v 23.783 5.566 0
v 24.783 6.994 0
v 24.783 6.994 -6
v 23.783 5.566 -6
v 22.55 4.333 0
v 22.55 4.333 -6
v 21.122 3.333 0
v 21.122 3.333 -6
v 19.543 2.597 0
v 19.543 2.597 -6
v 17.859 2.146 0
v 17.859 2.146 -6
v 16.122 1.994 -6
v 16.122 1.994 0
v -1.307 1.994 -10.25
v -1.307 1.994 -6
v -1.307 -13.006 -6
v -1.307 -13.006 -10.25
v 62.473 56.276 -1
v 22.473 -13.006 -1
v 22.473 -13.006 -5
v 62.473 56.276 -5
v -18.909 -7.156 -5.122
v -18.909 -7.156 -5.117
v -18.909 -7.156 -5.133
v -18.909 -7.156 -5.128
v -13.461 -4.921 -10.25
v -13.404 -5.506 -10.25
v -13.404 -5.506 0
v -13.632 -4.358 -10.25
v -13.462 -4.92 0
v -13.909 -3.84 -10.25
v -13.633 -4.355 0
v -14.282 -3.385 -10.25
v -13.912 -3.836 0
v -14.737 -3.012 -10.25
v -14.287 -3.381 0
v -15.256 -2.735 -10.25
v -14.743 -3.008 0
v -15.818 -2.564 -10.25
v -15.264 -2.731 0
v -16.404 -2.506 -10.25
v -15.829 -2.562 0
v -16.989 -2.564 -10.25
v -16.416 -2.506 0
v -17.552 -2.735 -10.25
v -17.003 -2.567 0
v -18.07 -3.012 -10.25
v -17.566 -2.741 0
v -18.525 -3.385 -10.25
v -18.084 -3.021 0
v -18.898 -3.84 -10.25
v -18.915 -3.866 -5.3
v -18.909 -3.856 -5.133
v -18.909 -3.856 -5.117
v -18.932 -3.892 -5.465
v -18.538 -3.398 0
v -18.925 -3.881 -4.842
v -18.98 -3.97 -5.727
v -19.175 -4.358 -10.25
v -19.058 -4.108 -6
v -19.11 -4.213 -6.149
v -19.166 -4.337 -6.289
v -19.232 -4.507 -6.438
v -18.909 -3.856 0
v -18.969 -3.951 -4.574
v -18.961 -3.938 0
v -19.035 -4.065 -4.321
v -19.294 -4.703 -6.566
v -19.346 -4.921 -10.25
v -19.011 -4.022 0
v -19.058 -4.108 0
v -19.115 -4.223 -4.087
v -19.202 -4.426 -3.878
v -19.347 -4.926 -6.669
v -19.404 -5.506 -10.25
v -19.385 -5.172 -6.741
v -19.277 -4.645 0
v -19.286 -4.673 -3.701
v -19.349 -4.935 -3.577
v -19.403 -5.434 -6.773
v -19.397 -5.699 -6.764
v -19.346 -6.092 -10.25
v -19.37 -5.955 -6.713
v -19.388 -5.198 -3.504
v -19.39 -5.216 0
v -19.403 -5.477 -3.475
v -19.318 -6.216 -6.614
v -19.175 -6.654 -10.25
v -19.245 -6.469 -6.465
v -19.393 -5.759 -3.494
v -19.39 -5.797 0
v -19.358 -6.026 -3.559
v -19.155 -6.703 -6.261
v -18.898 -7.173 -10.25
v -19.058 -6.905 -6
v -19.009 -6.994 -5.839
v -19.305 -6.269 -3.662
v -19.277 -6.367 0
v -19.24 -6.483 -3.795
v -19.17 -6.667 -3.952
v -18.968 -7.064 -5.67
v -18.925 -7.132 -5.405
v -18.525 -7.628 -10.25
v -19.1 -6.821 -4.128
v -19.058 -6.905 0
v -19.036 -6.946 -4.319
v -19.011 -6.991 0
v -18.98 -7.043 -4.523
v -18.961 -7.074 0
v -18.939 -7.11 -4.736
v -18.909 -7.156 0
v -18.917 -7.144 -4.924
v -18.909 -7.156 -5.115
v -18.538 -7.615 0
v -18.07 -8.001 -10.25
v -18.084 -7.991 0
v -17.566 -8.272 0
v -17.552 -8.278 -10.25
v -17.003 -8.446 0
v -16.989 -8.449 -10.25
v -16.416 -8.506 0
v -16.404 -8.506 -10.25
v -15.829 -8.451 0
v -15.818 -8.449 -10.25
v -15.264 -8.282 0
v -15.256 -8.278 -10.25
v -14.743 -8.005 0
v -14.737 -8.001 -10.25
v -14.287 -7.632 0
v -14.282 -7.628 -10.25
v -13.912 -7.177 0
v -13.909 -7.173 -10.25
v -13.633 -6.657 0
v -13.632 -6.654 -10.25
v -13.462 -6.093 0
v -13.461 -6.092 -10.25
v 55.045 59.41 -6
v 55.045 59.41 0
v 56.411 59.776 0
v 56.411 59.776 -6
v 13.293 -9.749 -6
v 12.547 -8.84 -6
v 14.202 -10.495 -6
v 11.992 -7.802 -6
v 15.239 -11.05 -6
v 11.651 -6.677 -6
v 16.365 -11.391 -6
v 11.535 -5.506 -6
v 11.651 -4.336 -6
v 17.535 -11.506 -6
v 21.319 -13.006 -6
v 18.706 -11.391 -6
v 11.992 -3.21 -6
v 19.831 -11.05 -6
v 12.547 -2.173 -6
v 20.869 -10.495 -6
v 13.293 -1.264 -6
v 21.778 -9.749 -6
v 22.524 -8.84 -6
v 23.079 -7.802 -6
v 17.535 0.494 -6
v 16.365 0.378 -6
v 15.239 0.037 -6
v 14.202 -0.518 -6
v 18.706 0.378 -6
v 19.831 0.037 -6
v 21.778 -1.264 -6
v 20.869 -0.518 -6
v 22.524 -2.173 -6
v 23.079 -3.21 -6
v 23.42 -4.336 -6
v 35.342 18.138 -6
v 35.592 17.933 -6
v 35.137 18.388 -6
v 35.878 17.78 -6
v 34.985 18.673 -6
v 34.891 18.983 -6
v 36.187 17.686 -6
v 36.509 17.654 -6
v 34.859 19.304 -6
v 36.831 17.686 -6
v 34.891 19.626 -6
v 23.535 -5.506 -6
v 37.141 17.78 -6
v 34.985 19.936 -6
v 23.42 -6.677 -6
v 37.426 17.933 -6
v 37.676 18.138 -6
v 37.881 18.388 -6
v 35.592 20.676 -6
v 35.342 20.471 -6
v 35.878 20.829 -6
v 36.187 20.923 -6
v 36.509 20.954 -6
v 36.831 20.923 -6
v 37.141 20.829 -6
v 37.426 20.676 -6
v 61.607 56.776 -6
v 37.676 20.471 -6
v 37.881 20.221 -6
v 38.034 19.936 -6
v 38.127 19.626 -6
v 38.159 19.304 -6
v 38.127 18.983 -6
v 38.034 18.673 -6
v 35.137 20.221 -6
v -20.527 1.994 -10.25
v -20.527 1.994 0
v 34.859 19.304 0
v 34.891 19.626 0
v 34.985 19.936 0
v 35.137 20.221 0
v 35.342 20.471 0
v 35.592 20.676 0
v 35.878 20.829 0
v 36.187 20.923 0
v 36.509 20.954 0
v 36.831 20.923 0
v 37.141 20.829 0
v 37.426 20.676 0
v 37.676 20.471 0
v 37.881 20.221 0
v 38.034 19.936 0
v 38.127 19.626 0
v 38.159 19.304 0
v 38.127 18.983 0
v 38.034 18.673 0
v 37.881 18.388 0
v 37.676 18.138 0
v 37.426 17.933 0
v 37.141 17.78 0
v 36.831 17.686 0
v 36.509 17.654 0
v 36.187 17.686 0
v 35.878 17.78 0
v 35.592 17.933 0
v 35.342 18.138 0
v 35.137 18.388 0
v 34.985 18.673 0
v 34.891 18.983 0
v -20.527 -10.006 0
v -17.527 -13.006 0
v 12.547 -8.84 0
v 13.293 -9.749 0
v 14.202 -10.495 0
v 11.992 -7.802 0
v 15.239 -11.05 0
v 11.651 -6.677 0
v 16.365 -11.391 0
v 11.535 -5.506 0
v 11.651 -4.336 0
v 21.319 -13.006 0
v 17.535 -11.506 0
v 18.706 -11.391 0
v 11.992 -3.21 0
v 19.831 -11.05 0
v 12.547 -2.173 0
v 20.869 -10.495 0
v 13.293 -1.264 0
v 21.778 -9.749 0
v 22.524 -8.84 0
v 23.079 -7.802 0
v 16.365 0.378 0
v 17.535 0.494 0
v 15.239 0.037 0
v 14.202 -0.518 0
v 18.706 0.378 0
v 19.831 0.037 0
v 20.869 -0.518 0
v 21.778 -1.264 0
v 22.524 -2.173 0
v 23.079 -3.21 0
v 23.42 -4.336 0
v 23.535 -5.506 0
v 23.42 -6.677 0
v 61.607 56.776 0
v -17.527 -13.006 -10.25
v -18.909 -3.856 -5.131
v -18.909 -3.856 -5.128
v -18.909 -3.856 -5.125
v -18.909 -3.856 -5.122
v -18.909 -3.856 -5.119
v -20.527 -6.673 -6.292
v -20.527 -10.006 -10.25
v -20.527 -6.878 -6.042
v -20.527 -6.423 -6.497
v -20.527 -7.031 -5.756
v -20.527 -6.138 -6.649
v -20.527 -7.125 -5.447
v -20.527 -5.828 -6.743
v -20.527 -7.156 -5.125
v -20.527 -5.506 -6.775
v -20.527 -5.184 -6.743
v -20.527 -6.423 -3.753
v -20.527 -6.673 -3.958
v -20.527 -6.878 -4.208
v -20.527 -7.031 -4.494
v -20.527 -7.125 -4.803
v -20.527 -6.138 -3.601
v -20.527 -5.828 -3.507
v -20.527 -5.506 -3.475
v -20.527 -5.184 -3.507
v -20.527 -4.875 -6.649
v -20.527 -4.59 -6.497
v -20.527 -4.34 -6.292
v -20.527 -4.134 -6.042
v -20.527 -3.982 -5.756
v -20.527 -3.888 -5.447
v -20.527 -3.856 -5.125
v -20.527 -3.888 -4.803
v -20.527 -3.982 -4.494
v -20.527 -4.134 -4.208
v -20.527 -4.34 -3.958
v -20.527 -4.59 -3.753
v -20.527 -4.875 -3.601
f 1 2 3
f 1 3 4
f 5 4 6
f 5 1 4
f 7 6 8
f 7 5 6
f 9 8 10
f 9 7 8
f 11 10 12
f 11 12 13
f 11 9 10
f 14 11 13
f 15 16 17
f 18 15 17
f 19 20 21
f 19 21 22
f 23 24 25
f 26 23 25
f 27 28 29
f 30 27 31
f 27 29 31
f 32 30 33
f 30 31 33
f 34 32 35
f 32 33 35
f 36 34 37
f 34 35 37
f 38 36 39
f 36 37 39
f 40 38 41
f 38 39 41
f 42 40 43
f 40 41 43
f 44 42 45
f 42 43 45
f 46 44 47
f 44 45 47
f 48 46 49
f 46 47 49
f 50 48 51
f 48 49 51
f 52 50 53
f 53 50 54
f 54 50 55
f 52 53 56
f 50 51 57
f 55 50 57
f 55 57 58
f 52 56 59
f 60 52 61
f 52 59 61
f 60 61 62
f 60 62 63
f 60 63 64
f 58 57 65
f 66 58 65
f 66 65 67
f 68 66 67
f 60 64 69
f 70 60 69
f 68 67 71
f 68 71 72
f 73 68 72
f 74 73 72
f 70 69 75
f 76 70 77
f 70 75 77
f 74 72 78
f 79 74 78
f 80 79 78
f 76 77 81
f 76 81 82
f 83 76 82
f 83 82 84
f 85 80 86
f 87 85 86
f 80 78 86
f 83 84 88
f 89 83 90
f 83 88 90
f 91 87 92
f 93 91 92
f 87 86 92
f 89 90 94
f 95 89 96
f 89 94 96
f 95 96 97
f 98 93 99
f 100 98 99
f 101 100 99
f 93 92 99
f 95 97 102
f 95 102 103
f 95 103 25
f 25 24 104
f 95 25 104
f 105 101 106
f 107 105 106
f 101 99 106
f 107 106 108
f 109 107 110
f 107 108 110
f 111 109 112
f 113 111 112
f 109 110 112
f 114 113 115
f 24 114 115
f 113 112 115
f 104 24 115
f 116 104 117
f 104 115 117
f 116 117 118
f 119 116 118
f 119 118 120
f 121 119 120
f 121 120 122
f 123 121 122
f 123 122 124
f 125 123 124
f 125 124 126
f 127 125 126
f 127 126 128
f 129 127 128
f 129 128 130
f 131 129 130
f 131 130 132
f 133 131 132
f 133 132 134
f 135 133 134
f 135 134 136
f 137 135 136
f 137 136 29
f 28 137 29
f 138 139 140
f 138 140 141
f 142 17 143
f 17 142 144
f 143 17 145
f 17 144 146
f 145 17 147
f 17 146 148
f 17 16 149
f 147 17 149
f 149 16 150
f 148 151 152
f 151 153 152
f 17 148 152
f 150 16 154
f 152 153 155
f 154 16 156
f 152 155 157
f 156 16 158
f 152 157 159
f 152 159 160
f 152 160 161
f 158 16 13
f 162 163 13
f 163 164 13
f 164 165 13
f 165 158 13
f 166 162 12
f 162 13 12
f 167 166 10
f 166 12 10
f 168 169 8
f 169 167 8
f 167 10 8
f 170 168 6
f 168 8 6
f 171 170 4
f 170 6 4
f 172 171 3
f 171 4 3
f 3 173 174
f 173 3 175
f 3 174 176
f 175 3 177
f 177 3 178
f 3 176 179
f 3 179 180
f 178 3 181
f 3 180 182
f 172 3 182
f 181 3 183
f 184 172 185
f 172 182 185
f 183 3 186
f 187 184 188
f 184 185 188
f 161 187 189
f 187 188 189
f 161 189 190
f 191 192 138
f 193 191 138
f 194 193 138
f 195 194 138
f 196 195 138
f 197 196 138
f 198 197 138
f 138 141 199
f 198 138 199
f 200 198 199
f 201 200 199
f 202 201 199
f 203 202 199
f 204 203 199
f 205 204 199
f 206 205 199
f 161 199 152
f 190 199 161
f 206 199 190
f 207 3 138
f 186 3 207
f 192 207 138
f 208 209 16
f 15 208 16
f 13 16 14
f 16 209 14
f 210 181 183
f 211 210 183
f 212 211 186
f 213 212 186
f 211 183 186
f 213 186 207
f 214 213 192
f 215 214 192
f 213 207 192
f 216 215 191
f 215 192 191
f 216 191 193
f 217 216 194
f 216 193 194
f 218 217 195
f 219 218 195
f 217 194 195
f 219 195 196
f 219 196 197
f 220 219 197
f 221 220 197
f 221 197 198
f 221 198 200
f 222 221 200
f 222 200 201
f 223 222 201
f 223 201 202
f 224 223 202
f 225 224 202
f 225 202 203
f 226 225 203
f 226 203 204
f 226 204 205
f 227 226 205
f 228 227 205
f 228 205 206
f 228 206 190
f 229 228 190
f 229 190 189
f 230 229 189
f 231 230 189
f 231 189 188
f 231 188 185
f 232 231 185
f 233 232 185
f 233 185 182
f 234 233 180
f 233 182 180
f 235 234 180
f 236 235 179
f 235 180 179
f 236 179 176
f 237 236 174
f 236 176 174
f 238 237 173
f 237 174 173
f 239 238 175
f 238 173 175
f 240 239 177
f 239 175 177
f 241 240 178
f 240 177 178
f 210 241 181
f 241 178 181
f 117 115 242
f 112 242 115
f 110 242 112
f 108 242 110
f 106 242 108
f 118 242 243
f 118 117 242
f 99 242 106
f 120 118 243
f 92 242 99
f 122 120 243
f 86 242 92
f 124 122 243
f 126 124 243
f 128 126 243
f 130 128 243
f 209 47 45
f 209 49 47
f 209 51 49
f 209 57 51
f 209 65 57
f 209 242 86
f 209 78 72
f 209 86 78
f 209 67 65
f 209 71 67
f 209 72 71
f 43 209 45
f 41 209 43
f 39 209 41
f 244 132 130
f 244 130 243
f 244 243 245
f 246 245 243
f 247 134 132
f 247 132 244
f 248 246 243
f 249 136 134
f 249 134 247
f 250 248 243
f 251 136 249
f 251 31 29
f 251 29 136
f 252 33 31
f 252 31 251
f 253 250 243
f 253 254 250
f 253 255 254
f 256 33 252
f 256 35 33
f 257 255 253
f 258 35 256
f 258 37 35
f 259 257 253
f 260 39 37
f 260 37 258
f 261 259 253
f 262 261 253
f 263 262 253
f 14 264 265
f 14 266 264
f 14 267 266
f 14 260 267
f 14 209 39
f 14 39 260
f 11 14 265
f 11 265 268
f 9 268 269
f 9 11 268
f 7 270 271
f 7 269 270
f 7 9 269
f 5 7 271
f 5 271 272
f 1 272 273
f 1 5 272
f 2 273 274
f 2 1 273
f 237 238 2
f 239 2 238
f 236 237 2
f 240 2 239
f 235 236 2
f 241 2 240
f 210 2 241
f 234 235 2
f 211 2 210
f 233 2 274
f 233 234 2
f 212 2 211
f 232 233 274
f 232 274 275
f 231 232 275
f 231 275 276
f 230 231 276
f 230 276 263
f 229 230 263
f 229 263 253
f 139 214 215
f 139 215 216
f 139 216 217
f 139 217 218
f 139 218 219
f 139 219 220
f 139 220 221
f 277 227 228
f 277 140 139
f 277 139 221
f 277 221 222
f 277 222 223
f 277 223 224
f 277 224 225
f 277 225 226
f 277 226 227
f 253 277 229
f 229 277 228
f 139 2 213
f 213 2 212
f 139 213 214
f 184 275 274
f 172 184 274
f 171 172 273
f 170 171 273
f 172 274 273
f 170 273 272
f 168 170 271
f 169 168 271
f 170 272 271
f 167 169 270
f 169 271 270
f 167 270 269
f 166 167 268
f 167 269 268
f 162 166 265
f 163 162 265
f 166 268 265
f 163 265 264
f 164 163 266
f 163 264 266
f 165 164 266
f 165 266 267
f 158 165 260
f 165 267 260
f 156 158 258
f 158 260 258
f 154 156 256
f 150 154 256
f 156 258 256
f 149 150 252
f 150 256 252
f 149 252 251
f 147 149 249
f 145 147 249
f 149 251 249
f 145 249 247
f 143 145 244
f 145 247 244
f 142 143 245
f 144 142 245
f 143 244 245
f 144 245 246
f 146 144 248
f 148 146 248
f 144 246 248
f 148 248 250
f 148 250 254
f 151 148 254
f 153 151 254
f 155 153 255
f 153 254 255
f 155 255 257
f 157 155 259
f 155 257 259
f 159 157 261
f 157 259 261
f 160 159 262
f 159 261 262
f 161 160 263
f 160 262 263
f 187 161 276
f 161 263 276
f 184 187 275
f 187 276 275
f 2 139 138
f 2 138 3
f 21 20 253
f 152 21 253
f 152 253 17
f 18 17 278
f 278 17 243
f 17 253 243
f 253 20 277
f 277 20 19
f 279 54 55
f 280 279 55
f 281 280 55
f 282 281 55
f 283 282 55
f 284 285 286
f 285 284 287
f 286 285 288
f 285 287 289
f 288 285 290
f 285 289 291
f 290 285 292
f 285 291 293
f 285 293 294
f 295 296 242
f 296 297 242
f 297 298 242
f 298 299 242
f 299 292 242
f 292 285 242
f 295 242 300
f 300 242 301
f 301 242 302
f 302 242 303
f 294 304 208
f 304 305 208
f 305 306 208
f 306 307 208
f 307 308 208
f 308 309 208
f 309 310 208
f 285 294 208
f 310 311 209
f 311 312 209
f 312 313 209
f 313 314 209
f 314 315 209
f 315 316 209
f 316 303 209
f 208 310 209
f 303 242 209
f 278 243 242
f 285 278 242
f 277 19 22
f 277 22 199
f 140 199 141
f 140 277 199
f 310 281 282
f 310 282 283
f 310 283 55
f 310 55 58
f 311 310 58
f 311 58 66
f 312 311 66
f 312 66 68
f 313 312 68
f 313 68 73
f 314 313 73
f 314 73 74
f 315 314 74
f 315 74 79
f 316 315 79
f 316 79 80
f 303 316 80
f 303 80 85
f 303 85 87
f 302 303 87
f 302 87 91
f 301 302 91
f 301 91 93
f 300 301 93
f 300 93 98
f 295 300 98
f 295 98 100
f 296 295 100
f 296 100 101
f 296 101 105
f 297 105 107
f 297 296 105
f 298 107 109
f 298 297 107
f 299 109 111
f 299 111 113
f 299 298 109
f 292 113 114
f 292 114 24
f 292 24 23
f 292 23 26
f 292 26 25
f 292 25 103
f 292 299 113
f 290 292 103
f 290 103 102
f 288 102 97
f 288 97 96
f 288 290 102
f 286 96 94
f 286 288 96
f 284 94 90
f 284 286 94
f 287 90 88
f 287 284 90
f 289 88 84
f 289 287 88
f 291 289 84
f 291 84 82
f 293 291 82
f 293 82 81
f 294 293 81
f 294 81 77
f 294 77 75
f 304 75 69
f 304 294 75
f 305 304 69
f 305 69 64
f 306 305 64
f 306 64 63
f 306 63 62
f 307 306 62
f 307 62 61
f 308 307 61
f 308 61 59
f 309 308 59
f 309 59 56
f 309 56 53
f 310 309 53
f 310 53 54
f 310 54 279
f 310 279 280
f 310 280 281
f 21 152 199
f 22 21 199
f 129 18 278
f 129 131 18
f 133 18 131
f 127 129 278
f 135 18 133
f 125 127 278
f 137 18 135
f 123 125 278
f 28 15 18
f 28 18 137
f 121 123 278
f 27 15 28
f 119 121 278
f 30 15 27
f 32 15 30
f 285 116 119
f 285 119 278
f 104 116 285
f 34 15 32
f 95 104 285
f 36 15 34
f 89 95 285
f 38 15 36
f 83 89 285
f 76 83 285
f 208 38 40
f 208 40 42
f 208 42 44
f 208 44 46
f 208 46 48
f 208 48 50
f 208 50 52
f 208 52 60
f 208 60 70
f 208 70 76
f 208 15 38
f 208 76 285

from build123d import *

# Parameters (mm, degrees)
SKETCH1_R                       = 3
SKETCH1_R_2                     = 6
BOSS_EXTRUDE1_DEPTH             = 6
M4X0_7_TAPPED_HOLE1_D           = 3.3
CHAMFER1_SIZE                   = 3
CHAMFER2_SIZE                   = 1
BOSS_EXTRUDE2_DEPTH             = 4.25
M4X0_7_START                    = -20.526744186
M4X0_7_TAPPED_HOLE3_OUTLINE_R   = 1.65
M4X0_7_TAPPED_HOLE3_DEPTH       = 1.123131525
M4X0_7_START_2                  = -19.403612661
M4X0_7_TAPPED_HOLE3_2_OUTLINE_R = 1.65
M4X0_7_TAPPED_HOLE3_2_DEPTH     = 0.494491736
M4X0_7_START_3                  = -6.0000001
M4X0_7_TAPPED_HOLE3_3_DEPTH     = 6.0000002
M4X0_7_START_4                  = -6.7750001
M4X0_7_TAPPED_HOLE3_4_DEPTH     = 0.775
SKETCH14_R                      = 3
CUT_EXTRUDE1_DEPTH              = 87.67199356


with BuildPart() as part:
    # Sketch1 → Boss-Extrude1 (new body)
    with BuildSketch(Plane.XY):
        with BuildLine():
            Line((62.473255814, 56.275636954), (55.545052584, 60.275636954))
            Line((55.545052584, 60.275636954), (24.782656891, 6.993604651))
            ThreePointArc((24.782656891, 6.993604651), (21.122402853, 3.333350613), (16.122402853, 1.993604651))
            Line((16.122402853, 1.993604651), (-20.526744186, 1.993604651))
            Line((-20.526744186, 1.993604651), (-20.526744186, -13.006395349))
            Line((-20.526744186, -13.006395349), (22.473255814, -13.006395349))
            Line((22.473255814, -13.006395349), (62.473255814, 56.275636954))
        make_face()
        with Locations((-16.403612561, -5.506395349)):
            Circle(SKETCH1_R, mode=Mode.SUBTRACT)
        with Locations((17.535345593, -5.506395349)):
            Circle(SKETCH1_R_2, mode=Mode.SUBTRACT)
    extrude(amount=-BOSS_EXTRUDE1_DEPTH)

    # M4x0.7 Tapped Hole1 (through all)
    with Locations(Plane.XY):
        with Locations((36.509154199, 19.304493784)):
            Hole(M4X0_7_TAPPED_HOLE1_D / 2)

    # Chamfer1
    chamfer1_edges = [part.edges().sort_by_distance(p)[0] for p in [
        (-20.526744186, -13.006395349, -3),
    ]]
    chamfer(chamfer1_edges, length=CHAMFER1_SIZE)

    # Chamfer2
    chamfer2_edges = [part.edges().sort_by_distance(p)[0] for p in [
        (42.473255814, 21.634620803, -6),
        (55.545052584, 60.275636954, -3),
        (42.473255814, 21.634620803, 0),
    ]]
    chamfer(chamfer2_edges, length=CHAMFER2_SIZE)

    # Sketch6 → Boss-Extrude2 (add)
    with BuildSketch(Plane(origin=(0, 0, -6), x_dir=(-1, 0, 0), z_dir=(0, 0, -1))):
        Polygon((20.526744186, 1.993604651), (1.306644629, 1.993604651), (1.306644629, -13.006395349), (17.526744186, -13.006395349), (20.526744186, -10.006395349), align=None)
    extrude(amount=BOSS_EXTRUDE2_DEPTH)

    # M4x0.7 Tapped Hole3: read off the stored shape, not the designer's step
    # M4x0.7 Tapped Hole3 outline → M4x0.7 Tapped Hole3 (cut)
    with BuildSketch(Plane.YZ.offset(M4X0_7_START)):
        with Locations((-5.506395349, -5.125)):
            Circle(M4X0_7_TAPPED_HOLE3_OUTLINE_R)
    extrude(amount=M4X0_7_TAPPED_HOLE3_DEPTH, mode=Mode.SUBTRACT)

    # M4x0.7 Tapped Hole3 2 outline → M4x0.7 Tapped Hole3 2 (cut)
    with BuildSketch(Plane.YZ.offset(M4X0_7_START_2)):
        with Locations((-5.506395349, -5.125)):
            Circle(M4X0_7_TAPPED_HOLE3_2_OUTLINE_R)
    extrude(amount=M4X0_7_TAPPED_HOLE3_2_DEPTH, mode=Mode.SUBTRACT)

    # M4x0.7 Tapped Hole3 3 outline → M4x0.7 Tapped Hole3 3 (cut)
    with BuildSketch(Plane.XY.offset(M4X0_7_START_3)):
        with BuildLine():
            ThreePointArc((-18.909118414, -3.856413403), (-18.986363136, -3.980158321), (-19.057501217, -4.107511865))
            ThreePointArc((-19.057501217, -4.107511865), (-19.403612561, -5.506395898), (-19.057500704, -6.905279805))
            ThreePointArc((-19.057500704, -6.905279805), (-18.98636247, -7.032633505), (-18.909117577, -7.156378566))
            Line((-18.909117577, -7.156378566), (-18.909118414, -3.856413403))
        make_face()
    extrude(amount=M4X0_7_TAPPED_HOLE3_3_DEPTH, mode=Mode.SUBTRACT)

    # M4x0.7 Tapped Hole3 4 outline → M4x0.7 Tapped Hole3 4 (add)
    with BuildSketch(Plane.XY.offset(M4X0_7_START_4)):
        with BuildLine():
            ThreePointArc((-18.909118414, -3.856413403), (-18.986363136, -3.980158321), (-19.057501217, -4.107511865))
            ThreePointArc((-19.057501217, -4.107511865), (-19.403612561, -5.506395898), (-19.057500704, -6.905279805))
            ThreePointArc((-19.057500704, -6.905279805), (-18.98636247, -7.032633505), (-18.909117577, -7.156378566))
            Line((-18.909117577, -7.156378566), (-18.909118414, -3.856413403))
        make_face()
    extrude(amount=M4X0_7_TAPPED_HOLE3_4_DEPTH)

    # Sketch14 → Cut-Extrude1 (cut, through all)
    with BuildSketch(Plane.XY.offset(-6)):
        with Locations((-16.403612561, -5.506395349)):
            Circle(SKETCH14_R)
    extrude(amount=-CUT_EXTRUDE1_DEPTH, mode=Mode.SUBTRACT)


solid = part.part
